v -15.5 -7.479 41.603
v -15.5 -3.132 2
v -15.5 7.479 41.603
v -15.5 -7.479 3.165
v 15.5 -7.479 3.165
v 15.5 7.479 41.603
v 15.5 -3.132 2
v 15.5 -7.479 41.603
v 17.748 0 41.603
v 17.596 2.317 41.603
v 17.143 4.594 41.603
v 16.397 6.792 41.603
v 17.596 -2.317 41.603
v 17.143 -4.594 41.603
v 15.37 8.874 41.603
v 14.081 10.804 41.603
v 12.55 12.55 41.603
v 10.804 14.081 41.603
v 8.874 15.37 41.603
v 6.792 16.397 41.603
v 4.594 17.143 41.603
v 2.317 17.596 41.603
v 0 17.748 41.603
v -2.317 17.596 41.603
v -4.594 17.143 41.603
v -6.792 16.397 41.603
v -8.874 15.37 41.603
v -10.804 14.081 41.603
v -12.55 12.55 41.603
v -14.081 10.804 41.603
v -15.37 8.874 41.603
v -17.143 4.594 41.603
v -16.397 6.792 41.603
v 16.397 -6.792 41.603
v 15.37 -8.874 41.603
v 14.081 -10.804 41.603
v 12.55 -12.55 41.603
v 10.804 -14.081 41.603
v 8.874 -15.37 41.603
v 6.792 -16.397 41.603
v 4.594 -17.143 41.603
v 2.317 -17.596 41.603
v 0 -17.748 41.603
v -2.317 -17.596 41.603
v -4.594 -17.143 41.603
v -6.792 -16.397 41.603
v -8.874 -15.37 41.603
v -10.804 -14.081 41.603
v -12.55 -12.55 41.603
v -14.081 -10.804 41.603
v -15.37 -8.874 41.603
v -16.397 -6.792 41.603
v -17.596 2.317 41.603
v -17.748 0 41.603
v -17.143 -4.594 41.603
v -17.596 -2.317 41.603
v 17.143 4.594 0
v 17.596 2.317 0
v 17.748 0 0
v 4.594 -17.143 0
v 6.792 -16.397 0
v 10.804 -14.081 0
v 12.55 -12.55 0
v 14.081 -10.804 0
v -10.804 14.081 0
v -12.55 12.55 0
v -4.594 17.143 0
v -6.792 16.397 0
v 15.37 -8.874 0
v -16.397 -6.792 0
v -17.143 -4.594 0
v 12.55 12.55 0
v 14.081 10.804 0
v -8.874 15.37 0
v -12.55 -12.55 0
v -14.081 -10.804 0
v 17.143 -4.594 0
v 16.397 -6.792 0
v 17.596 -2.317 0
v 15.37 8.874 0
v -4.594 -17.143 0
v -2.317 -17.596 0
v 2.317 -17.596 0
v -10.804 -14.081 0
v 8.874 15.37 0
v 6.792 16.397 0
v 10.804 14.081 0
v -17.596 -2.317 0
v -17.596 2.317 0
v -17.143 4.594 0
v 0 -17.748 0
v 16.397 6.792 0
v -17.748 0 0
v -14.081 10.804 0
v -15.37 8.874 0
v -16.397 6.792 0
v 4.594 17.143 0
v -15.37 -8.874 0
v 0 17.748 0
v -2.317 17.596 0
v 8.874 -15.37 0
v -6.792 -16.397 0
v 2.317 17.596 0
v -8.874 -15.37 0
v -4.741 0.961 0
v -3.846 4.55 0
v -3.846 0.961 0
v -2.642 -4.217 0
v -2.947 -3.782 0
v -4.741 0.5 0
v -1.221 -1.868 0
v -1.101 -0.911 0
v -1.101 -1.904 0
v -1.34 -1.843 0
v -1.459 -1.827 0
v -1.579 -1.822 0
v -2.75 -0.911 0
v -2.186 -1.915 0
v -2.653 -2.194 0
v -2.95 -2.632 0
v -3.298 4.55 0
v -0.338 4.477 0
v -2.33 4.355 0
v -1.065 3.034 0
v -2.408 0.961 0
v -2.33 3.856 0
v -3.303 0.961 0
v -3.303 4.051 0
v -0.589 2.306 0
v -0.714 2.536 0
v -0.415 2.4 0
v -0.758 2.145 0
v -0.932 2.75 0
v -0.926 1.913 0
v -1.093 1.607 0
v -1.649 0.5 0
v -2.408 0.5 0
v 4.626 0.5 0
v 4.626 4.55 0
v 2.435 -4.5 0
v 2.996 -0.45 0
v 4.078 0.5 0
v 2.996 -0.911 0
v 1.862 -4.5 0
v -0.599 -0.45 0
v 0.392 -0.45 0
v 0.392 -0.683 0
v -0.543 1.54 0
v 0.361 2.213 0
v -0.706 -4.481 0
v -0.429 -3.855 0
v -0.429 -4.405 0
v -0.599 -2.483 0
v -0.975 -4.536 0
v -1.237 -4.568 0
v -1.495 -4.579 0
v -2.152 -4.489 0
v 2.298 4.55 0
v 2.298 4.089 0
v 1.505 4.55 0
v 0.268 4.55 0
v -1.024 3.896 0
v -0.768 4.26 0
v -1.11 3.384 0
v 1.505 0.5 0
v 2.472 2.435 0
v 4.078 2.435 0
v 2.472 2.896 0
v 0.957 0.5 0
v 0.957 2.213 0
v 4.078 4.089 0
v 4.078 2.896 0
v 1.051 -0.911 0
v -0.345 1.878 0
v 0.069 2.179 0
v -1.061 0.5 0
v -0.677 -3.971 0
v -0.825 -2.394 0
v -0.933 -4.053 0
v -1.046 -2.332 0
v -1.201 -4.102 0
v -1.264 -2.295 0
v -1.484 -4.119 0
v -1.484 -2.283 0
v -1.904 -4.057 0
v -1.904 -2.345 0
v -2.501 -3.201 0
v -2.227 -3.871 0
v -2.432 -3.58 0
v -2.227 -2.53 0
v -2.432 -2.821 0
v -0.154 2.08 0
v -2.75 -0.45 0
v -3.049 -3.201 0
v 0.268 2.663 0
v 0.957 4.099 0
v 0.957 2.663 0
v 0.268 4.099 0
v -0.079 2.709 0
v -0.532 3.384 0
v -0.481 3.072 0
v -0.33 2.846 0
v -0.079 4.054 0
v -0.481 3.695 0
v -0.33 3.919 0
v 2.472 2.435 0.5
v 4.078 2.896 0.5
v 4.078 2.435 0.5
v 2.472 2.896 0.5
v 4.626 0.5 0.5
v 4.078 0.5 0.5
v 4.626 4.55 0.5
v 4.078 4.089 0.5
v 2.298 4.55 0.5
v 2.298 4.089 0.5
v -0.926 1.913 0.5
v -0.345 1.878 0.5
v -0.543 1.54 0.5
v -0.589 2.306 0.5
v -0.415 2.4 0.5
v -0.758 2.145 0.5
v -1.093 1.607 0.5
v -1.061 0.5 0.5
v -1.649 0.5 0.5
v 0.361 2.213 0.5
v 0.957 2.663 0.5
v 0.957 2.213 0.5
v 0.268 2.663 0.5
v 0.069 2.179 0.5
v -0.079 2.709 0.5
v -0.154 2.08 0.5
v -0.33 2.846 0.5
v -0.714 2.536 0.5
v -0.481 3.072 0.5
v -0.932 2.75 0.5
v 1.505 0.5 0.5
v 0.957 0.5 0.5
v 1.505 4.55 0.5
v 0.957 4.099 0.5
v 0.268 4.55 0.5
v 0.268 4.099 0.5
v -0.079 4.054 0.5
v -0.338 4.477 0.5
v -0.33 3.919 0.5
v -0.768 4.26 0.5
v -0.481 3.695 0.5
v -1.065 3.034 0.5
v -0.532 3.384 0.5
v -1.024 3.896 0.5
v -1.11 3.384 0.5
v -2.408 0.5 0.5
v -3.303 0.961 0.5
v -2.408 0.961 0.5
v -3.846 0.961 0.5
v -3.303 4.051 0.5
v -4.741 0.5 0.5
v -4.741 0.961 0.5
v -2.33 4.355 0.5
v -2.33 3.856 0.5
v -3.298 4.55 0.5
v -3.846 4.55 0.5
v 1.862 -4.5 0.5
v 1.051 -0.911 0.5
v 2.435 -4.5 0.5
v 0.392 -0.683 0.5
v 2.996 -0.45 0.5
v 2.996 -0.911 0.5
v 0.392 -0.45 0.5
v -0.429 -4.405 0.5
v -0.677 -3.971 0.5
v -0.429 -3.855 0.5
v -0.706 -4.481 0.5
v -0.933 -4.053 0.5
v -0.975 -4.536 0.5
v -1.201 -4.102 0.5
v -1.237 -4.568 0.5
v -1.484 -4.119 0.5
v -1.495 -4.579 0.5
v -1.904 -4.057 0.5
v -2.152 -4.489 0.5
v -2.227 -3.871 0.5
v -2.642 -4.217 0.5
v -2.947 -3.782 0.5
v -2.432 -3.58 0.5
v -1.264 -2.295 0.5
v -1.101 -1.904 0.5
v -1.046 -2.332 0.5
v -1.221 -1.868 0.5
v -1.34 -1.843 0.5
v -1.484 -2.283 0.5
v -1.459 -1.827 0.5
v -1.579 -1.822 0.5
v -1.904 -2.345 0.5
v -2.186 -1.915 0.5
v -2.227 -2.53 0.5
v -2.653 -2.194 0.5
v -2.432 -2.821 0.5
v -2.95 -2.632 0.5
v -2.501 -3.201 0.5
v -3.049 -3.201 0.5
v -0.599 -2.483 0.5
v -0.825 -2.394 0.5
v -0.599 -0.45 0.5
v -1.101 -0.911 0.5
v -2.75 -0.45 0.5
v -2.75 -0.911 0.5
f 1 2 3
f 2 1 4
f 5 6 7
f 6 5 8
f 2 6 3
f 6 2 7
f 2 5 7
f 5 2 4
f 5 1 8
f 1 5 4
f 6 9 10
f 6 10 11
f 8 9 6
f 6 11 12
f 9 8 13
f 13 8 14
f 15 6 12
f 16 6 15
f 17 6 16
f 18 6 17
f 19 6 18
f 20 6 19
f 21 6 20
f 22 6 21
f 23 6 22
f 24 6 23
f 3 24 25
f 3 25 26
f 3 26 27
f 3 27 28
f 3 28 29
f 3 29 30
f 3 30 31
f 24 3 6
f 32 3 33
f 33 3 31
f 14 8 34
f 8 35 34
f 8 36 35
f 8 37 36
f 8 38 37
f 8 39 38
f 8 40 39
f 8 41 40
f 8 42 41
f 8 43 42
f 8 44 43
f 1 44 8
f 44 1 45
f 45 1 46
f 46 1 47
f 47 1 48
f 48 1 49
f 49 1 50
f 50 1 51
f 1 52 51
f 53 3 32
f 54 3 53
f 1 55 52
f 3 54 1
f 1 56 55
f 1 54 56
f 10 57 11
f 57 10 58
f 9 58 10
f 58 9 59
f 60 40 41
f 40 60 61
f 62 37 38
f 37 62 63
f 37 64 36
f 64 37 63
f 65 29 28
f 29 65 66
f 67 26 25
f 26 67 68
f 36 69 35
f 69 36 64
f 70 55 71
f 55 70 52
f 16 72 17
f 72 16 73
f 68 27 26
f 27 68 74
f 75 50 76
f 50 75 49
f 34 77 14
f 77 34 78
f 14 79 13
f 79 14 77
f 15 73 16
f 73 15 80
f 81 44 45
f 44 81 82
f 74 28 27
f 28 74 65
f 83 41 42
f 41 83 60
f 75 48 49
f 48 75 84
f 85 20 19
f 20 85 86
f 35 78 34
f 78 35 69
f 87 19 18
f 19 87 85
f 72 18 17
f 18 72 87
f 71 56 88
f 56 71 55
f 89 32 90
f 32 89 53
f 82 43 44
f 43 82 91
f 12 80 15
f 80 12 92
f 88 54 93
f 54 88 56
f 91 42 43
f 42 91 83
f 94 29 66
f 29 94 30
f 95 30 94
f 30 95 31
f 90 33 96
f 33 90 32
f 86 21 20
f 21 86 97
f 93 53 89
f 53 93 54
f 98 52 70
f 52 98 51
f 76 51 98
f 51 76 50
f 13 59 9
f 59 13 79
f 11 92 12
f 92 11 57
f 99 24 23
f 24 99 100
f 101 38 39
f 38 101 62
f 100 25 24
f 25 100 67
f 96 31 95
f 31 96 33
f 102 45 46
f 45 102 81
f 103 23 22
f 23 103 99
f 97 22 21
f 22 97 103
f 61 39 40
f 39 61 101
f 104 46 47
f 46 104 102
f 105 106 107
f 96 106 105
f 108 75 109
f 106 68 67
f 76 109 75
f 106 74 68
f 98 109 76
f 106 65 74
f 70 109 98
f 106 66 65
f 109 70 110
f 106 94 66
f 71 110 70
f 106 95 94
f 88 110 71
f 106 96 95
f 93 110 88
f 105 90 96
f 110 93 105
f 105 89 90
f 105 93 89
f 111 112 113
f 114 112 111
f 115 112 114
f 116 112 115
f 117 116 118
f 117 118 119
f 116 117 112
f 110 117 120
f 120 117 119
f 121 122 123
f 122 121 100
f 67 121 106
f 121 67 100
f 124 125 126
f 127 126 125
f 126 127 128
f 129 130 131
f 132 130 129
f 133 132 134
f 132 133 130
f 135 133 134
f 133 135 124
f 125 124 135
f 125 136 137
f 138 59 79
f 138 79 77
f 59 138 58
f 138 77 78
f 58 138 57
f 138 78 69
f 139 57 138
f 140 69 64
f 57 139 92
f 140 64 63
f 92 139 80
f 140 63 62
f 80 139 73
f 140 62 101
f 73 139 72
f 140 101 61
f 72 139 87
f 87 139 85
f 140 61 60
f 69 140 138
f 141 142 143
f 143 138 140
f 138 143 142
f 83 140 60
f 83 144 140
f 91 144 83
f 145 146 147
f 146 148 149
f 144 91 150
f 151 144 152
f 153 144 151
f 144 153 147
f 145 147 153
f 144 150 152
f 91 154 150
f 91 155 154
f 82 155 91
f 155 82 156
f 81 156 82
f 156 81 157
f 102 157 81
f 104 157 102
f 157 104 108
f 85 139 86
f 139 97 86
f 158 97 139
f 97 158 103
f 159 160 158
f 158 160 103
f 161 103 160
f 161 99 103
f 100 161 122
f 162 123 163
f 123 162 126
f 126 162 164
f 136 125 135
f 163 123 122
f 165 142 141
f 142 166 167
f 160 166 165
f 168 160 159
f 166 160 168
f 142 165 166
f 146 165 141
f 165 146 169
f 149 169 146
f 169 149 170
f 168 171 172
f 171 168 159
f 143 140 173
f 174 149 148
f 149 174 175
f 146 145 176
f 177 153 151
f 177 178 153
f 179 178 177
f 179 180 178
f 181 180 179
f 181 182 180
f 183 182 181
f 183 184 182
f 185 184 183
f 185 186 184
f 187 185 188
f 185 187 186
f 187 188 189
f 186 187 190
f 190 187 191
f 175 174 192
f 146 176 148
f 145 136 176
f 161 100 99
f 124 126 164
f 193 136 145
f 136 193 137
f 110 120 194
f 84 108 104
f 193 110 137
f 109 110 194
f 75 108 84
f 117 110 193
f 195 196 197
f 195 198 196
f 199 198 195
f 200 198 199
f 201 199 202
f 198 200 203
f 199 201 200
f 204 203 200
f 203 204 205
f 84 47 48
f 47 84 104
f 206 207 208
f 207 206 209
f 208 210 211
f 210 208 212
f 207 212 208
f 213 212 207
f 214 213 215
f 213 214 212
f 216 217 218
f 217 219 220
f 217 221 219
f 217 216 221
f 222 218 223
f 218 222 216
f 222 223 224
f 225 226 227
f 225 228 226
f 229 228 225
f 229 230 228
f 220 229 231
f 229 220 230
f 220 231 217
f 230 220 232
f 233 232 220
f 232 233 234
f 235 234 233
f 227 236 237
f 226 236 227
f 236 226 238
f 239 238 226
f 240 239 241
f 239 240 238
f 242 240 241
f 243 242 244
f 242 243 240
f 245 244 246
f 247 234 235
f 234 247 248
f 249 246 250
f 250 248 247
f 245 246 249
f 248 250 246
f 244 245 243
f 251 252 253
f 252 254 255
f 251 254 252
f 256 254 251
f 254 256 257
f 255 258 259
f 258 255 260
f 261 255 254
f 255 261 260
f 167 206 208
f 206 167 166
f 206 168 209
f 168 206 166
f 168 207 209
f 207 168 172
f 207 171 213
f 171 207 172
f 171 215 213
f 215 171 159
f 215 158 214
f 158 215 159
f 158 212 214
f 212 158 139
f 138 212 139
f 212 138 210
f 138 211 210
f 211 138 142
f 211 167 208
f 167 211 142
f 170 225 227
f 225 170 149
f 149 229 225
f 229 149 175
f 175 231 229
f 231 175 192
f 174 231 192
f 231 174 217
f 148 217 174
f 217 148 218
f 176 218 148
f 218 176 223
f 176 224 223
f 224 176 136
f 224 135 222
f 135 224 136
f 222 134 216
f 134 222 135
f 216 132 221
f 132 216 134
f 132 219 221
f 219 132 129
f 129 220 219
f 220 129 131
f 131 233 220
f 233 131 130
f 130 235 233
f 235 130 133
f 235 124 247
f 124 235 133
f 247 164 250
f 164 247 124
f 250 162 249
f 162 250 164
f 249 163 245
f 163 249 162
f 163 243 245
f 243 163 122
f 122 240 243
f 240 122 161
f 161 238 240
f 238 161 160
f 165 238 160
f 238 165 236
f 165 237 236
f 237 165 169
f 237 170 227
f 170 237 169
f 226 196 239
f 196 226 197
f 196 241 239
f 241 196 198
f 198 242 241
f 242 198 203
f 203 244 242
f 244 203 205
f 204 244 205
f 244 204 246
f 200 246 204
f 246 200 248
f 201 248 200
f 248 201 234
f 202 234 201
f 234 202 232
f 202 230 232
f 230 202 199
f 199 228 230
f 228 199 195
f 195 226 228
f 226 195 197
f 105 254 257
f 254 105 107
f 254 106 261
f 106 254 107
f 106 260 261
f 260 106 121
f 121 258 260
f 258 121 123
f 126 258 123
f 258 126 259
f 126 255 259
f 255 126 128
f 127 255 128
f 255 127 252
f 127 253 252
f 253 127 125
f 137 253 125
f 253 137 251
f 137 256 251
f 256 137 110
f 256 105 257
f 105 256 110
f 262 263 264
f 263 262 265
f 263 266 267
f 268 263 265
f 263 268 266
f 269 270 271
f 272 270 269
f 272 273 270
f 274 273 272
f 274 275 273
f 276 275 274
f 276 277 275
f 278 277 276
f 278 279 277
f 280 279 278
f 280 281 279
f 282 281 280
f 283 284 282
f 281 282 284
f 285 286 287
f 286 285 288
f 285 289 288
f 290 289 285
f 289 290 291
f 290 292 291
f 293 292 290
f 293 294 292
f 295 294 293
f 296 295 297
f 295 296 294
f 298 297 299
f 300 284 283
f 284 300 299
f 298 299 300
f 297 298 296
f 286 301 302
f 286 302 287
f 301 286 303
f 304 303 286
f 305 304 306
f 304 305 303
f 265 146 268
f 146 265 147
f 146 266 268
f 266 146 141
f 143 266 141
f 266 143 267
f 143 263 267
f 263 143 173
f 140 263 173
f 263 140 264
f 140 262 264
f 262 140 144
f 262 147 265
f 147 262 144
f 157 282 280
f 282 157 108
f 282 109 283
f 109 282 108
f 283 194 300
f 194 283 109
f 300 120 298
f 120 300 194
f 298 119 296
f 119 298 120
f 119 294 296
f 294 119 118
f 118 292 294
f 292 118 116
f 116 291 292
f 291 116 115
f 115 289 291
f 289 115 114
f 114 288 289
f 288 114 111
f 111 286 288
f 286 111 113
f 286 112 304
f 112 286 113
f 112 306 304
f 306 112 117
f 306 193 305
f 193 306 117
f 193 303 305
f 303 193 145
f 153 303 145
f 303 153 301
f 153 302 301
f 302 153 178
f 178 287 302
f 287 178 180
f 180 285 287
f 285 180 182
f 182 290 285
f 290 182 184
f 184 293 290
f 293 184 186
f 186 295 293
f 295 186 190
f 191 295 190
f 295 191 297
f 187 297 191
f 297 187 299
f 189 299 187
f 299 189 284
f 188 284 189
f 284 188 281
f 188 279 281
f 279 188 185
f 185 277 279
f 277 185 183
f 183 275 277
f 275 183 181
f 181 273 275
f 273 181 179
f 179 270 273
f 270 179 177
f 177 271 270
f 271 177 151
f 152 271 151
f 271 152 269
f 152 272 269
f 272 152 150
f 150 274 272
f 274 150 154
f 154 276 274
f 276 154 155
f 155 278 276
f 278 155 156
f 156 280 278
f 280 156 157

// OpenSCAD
// file: cylinder_outer.scad
 module cylinder_outer(h, d=1, r, center=false, fn=48){
   rad = !is_undef(r) ? r : d/2;
   fudge = 1/cos(180/fn);
   cylinder(h=h,r=rad*fudge,center=center,$fn=fn);
}
// main file
use <cylinder_outer.scad>

// fr 1: 28 x 38 mm
// fr 2: 26 x 40 mm

objW = 28;
objH = 38;
objD = 3;
objBuffer = 3;
theta = 75;
label1 = "FR1";
label2 = str(theta);

wallThickness = 0.5;

bufferedW = objW + objBuffer;
bufferedH = objH + objBuffer;
bufferedD = objD + 1.5;

projW = bufferedW;
projL1 = bufferedH * cos(theta);
projL2 = bufferedD * cos(90 - theta);
projH1 = bufferedH * sin(theta);
projH2 = bufferedD * sin(90 - theta);
projH = max(bufferedD, projL1 + projL2);

pts = [
        [0, -projL2, projH2], 
        [projW, -projL2, projH2],
        [projW, -projL2, projH1],
        [projW, projL1, projH1],
        [0, projL1, projH1],
        [0, -projL2, projH1]
      ];
      
faces = [
        [0, 1, 2, 5],
        [5, 2, 3, 4],
        [4, 3, 1, 0],
        [0, 5, 4],
        [1, 3, 2]
      ];

cylH = max(bufferedD, projH1) + 2;
cylD = sqrt(projW * projW + projH * projH) + 2 * wallThickness;


module trayCavity() {
    translate([-projW/2, -projL1/2 + projL2/2, 2]) { 
        rotate([theta,0,0]) cube([bufferedW,bufferedH,bufferedD]);
        polyhedron(points = pts, faces = faces);
    }
}


difference() {
  cylinder_outer(h=cylH, d=cylD);
  trayCavity();
  translate([0,0.5,0.5]) rotate([0,180,0]) linear_extrude(0.5) text(label1, 4, halign="center", font="Arial Rounded MT Bold");
  translate([0,-4.5,0.5]) rotate([0,180,0]) linear_extrude(0.5) text(label2, 4, halign="center", font="Arial Rounded MT Bold");
}



// translate([-4.75,-3.5,-2]) rotate([26,0,0]) cube([9.5,10.,.1]);


echo(cylD);
